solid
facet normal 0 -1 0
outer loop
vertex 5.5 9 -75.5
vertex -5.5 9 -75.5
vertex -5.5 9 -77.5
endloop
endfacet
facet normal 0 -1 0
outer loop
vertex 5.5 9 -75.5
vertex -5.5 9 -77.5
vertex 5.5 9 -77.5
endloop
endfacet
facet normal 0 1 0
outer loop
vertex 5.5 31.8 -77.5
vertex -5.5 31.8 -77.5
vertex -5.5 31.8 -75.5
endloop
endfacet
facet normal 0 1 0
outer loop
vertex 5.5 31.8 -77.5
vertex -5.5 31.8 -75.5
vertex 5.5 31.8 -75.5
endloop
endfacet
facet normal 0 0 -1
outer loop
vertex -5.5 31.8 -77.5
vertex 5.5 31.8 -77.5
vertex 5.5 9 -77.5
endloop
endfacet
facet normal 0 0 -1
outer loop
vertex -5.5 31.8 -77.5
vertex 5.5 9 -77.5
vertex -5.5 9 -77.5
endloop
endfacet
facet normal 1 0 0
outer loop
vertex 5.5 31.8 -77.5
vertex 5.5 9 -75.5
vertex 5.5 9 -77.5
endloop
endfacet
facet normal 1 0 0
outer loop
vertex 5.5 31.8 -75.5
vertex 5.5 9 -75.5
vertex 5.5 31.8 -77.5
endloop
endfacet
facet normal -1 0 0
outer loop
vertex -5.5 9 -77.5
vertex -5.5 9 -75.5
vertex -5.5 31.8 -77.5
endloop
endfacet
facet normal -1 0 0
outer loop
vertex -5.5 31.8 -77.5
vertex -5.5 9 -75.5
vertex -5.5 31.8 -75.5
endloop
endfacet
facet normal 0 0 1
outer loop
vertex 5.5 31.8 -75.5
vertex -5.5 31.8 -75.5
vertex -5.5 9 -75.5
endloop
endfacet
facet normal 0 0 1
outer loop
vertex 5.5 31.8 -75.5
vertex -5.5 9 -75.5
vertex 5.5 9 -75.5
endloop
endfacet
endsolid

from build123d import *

# Parameters (mm, degrees)
SKETCH1_W                       = 39
SKETCH1_H                       = 155
BOSS_EXTRUDE1_DEPTH             = 2
BOSS_EXTRUDE2_DEPTH             = 38
SKETCH3_W                       = 2
SKETCH3_H                       = 2
BOSS_EXTRUDE3_DEPTH             = 38
SKETCH4_W                       = 2
SKETCH4_H                       = 2
BOSS_EXTRUDE4_DEPTH             = 151
SKETCH6_W                       = 35
SKETCH6_H                       = 2.2
CUT_EXTRUDE1_DEPTH              = 160.340045186
SKETCH7_W                       = 35
SKETCH7_H                       = 2.2
CUT_EXTRUDE2_DEPTH              = 89.490112442
SKETCH5_W                       = 31
SKETCH5_H                       = 2
BOSS_EXTRUDE5_DEPTH             = 2
BOSS_EXTRUDE6_REACH             = 91.367
SKETCH8_W                       = 2
SKETCH8_H                       = 2
BOSS_EXTRUDE6_DIRECTION_2_REACH = 91.367
SKETCH10_W                      = 2
SKETCH10_H                      = 2.2
SKETCH10_W_2                    = 2.2
SKETCH10_H_2                    = 2
BOSS_EXTRUDE8_DEPTH             = 2
SKETCH11_W                      = 2
SKETCH11_H                      = 2.2
SKETCH11_W_2                    = 2.2
SKETCH11_H_2                    = 2
BOSS_EXTRUDE9_DEPTH             = 2
FILLET2_R                       = 2.5
SKETCH14_W                      = 36.5
SKETCH14_H                      = 7.75
BOSS_EXTRUDE10_DEPTH            = 2
SKETCH13_W                      = 31
SKETCH13_H                      = 3
CUT_EXTRUDE4_DEPTH              = 2
FILLET3_R                       = 2
FILLET4_R                       = 0.5
SKETCH15_R                      = 5.1
CUT_EXTRUDE5_DEPTH              = 90.367219941
SKETCH16_R                      = 7.1
BOSS_EXTRUDE11_DEPTH            = 1
FILLET5_R                       = 0.5
FILLET7_R                       = 0.5
CUT_EXTRUDE6_DEPTH              = 6
SKETCH18_W                      = 29
SKETCH18_H                      = 3
CUT_EXTRUDE8_DEPTH              = 90.367219986
CUT_EXTRUDE11_DEPTH             = 90.367219986
CUT_EXTRUDE11_DEPTH_BACK        = 90.367219986
SKETCH20_W                      = 5
SKETCH20_H                      = 40
SKETCH21_W                      = 9
SKETCH21_H                      = 31
CUT_EXTRUDE12_DEPTH             = 89.41097217
CUT_EXTRUDE13_DEPTH             = 41.425858061
CUT_EXTRUDE13_DEPTH_BACK        = 41.425858061
SKETCH22_W                      = 11
SKETCH22_H                      = 8.2


with BuildPart() as part:
    # Sketch1 → Boss-Extrude1 (new body)
    with BuildSketch(Plane(origin=(0, 0, 0), x_dir=(1, 0, 0), z_dir=(0, 1, 0))):
        Rectangle(SKETCH1_W, SKETCH1_H)
    extrude(amount=BOSS_EXTRUDE1_DEPTH)

    # Sketch2 → Boss-Extrude2 (add)
    with BuildSketch(Plane(origin=(0, 2, 0), x_dir=(1, 0, 0), z_dir=(0, 1, 0))):
        Polygon((-17.5, -77.5), (-17.5, -75.5), (-17.5, 75.5), (17.5, 75.5), (17.5, -75.5), (17.5, -77.5), (19.5, -77.5), (19.5, 77.5), (-19.5, 77.5), (-19.5, -77.5), align=None)
    extrude(amount=BOSS_EXTRUDE2_DEPTH)

    # Sketch3 → Boss-Extrude3 (add)
    with BuildSketch(Plane(origin=(0, 2, 0), x_dir=(1, 0, 0), z_dir=(0, 1, 0))):
        with Locations((-16.5, -76.5)):
            Rectangle(SKETCH3_W, SKETCH3_H)
        with Locations((-16.5, -72.3)):
            Rectangle(SKETCH3_W, SKETCH3_H)
        with Locations((16.5, -76.5)):
            Rectangle(SKETCH3_W, SKETCH3_H)
        with Locations((16.5, -72.3)):
            Rectangle(SKETCH3_W, SKETCH3_H)
    extrude(amount=BOSS_EXTRUDE3_DEPTH)

    # Sketch4 → Boss-Extrude4 (add)
    with BuildSketch(Plane.XY.offset(-75.5)):
        with Locations((-16.5, 39)):
            Rectangle(SKETCH4_W, SKETCH4_H)
        Polygon((-15.5, 33.8), (-17.5, 31.8), (-17.5, 35.8), (-15.5, 35.8), align=None)
        Polygon((15.5, 35.8), (17.5, 35.8), (17.5, 31.8), (15.5, 33.8), align=None)
        with Locations((16.5, 39)):
            Rectangle(SKETCH4_W, SKETCH4_H)
    extrude(amount=BOSS_EXTRUDE4_DEPTH)

    # Sketch6 → Cut-Extrude1 (cut, through all)
    with BuildSketch(Plane.XY.offset(-75.5)):
        with Locations((0, 36.9)):
            Rectangle(SKETCH6_W, SKETCH6_H)
    extrude(amount=CUT_EXTRUDE1_DEPTH, mode=Mode.SUBTRACT)

    # Sketch7 → Cut-Extrude2 (cut, through all)
    with BuildSketch(Plane(origin=(0, 2, 0), x_dir=(1, 0, 0), z_dir=(0, 1, 0))):
        with Locations((0, -74.4)):
            Rectangle(SKETCH7_W, SKETCH7_H)
    extrude(amount=CUT_EXTRUDE2_DEPTH, mode=Mode.SUBTRACT)

    # Sketch5 → Boss-Extrude5 (add)
    with BuildSketch(Plane(origin=(0, 2, 0), x_dir=(1, 0, 0), z_dir=(0, 1, 0))):
        with Locations((0, -76.5)):
            Rectangle(SKETCH5_W, SKETCH5_H)
        with Locations((0, -72.3)):
            Rectangle(SKETCH5_W, SKETCH5_H)
    extrude(amount=BOSS_EXTRUDE5_DEPTH)

    # Boss-Extrude6: up to this face of the body (flat: up to its plane)
    boss_extrude6_end = Plane(part.part.faces().sort_by_distance((17.5, 16.9, -2.1))[0])
    # Sketch8 → Boss-Extrude6 (add, up to the picked face)
    with BuildSketch(Plane(origin=(0, 0, 0), x_dir=(0, 0, -1), z_dir=(1, 0, 0)), mode=Mode.PRIVATE) as boss_extrude6_sk1:
        with Locations((74.5, 39)):
            Rectangle(SKETCH8_W, SKETCH8_H)
    boss_extrude6_tool1 = split(extrude(boss_extrude6_sk1.sketch, amount=BOSS_EXTRUDE6_REACH, mode=Mode.PRIVATE), bisect_by=boss_extrude6_end, keep=Keep.BOTH, mode=Mode.PRIVATE)
    # Sketch8 → Boss-Extrude6 (add, up to the picked face)
    with BuildSketch(Plane(origin=(0, 0, 0), x_dir=(0, 0, -1), z_dir=(1, 0, 0)), mode=Mode.PRIVATE) as boss_extrude6_sk2:
        Polygon((75.5, 35.8), (73.5, 35.8), (73.5, 33.8), (75.5, 31.8), align=None)
    boss_extrude6_tool2 = split(extrude(boss_extrude6_sk2.sketch, amount=BOSS_EXTRUDE6_REACH, mode=Mode.PRIVATE), bisect_by=boss_extrude6_end, keep=Keep.BOTH, mode=Mode.PRIVATE)
    add(boss_extrude6_tool1.solids().sort_by(Axis((0, 39, -74.5), (1, 0, 0)))[0])
    add(boss_extrude6_tool2.solids().sort_by(Axis((0, 34.244444, -74.611111), (1, 0, 0)))[0])

    # Boss-Extrude6 direction 2: up to this face of the body (flat: up to its plane)
    boss_extrude6_direction_2_end = Plane(part.part.faces().sort_by_distance((-17.5, 16.9, -2.1))[0])
    # Sketch8 → Boss-Extrude6 direction 2 (add, up to the picked face)
    with BuildSketch(Plane(origin=(0, 0, 0), x_dir=(0, 0, -1), z_dir=(1, 0, 0)), mode=Mode.PRIVATE) as boss_extrude6_direction_2_sk1:
        with Locations((74.5, 39)):
            Rectangle(SKETCH8_W, SKETCH8_H)
    boss_extrude6_direction_2_tool1 = split(extrude(boss_extrude6_direction_2_sk1.sketch, amount=-BOSS_EXTRUDE6_DIRECTION_2_REACH, mode=Mode.PRIVATE), bisect_by=boss_extrude6_direction_2_end, keep=Keep.BOTH, mode=Mode.PRIVATE)
    # Sketch8 → Boss-Extrude6 direction 2 (add, up to the picked face)
    with BuildSketch(Plane(origin=(0, 0, 0), x_dir=(0, 0, -1), z_dir=(1, 0, 0)), mode=Mode.PRIVATE) as boss_extrude6_direction_2_sk2:
        Polygon((75.5, 35.8), (73.5, 35.8), (73.5, 33.8), (75.5, 31.8), align=None)
    boss_extrude6_direction_2_tool2 = split(extrude(boss_extrude6_direction_2_sk2.sketch, amount=-BOSS_EXTRUDE6_DIRECTION_2_REACH, mode=Mode.PRIVATE), bisect_by=boss_extrude6_direction_2_end, keep=Keep.BOTH, mode=Mode.PRIVATE)
    add(boss_extrude6_direction_2_tool1.solids().sort_by(Axis((0, 39, -74.5), (-1, 0, 0)))[0])
    add(boss_extrude6_direction_2_tool2.solids().sort_by(Axis((0, 34.244444, -74.611111), (-1, 0, 0)))[0])

    # Sketch10 → Boss-Extrude8 (add)
    with BuildSketch(Plane(origin=(-17.5, 0, 0), x_dir=(0, 0, -1), z_dir=(1, 0, 0))):
        with Locations((-76.5, 36.9)):
            Rectangle(SKETCH10_W, SKETCH10_H)
        with Locations((-74.4, 39)):
            Rectangle(SKETCH10_W_2, SKETCH10_H_2)
    extrude(amount=BOSS_EXTRUDE8_DEPTH)

    # Sketch11 → Boss-Extrude9 (add)
    with BuildSketch(Plane.ZY.offset(-17.5)):
        with Locations((76.5, 36.9)):
            Rectangle(SKETCH11_W, SKETCH11_H)
        with Locations((74.4, 39)):
            Rectangle(SKETCH11_W_2, SKETCH11_H_2)
    extrude(amount=BOSS_EXTRUDE9_DEPTH)

    # Fillet2
    fillet2_edges = [part.edges().sort_by_distance(p)[0] for p in [
        (-17.5, 16.9, 71.3),
        (17.5, 16.9, 71.3),
        (19.5, 20, 77.5),
        (-19.5, 20, 77.5),
        (-19.5, 20, -77.5),
        (-17.5, 16.9, -75.5),
        (17.5, 16.9, -75.5),
        (19.5, 20, -77.5),
        (19.5, 40, 0),
        (-19.5, 40, 0),
        (19.5, 0, 0),
        (-19.5, 0, 0),
        (0, 40, -77.5),
        (0, 0, 77.5),
        (0, 0, -77.5),
        (-17.5, 40, 77.5),
        (17.5, 40, 77.5),
    ]]
    fillet(fillet2_edges, radius=FILLET2_R)

    # Sketch14 → Boss-Extrude10 (add)
    with BuildSketch(Plane.XY.offset(-75.5)):
        with Locations((0, 5.125)):
            Rectangle(SKETCH14_W, SKETCH14_H)
    extrude(amount=BOSS_EXTRUDE10_DEPTH)

    # Sketch13 → Cut-Extrude4 (cut)
    with BuildSketch(Plane(origin=(0, 0, -77.5), x_dir=(-1, 0, 0), z_dir=(0, 0, -1))):
        with Locations((0, 5.5)):
            Rectangle(SKETCH13_W, SKETCH13_H)
    extrude(amount=-CUT_EXTRUDE4_DEPTH, mode=Mode.SUBTRACT)

    # Fillet3
    fillet3_edges = [part.edges().sort_by_distance(p)[0] for p in [
        (0, 9, -73.5),
    ]]
    fillet(fillet3_edges, radius=FILLET3_R - 0.0001)  # a hair under: the kernel refuses the full size

    # Fillet4
    fillet4_edges = [part.edges().sort_by_distance(p)[0] for p in [
        (15.5, 5.5, -75.5),
        (15.5, 4, -76.5),
        (0, 7, -75.5),
        (15.5, 7, -76.5),
        (-15.5, 5.5, -75.5),
        (-15.5, 7, -76.5),
        (0, 4, -75.5),
        (-15.5, 4, -76.5),
        (15.5, 5.5, -77.5),
        (0, 4, -77.5),
        (-15.5, 5.5, -77.5),
        (0, 7, -77.5),
    ]]
    fillet(fillet4_edges, radius=FILLET4_R)

    # Sketch15 → Cut-Extrude5 (cut, through all)
    with BuildSketch(Plane.XZ):
        with Locations(Location((0, 38.75, 0), (0, 0, 270))):
            Circle(SKETCH15_R)
        with Locations(Location((0, -38.75, 0), (0, 0, 270))):
            Circle(SKETCH15_R)
    extrude(amount=-CUT_EXTRUDE5_DEPTH, mode=Mode.SUBTRACT)

    # Sketch16 → Boss-Extrude11 (add)
    with BuildSketch(Plane(origin=(0, 2, 0), x_dir=(1, 0, 0), z_dir=(0, 1, 0))):
        with Locations(Location((0, 38.75, 0), (0, 0, 270))):
            Circle(SKETCH16_R)
        with Locations(Location((0, -38.75, 0), (0, 0, 270))):
            Circle(SKETCH16_R)
    extrude(amount=BOSS_EXTRUDE11_DEPTH)

    # Fillet5
    fillet5_edges = [part.edges().sort_by_distance(p)[0] for p in [
        (0, 2, -45.85),
        (0, 3, -45.85),
        (0, 2, 31.65),
        (0, 3, 31.65),
    ]]
    fillet(fillet5_edges, radius=FILLET5_R - 0.0001)  # a hair under: the kernel refuses the full size

    # Fillet7
    fillet7_edges = [part.edges().sort_by_distance(p)[0] for p in [
        (15.5, 40, 0.75),
        (0, 4, 77.5),
        (0, 40, -73.5),
        (-15.5, 40, 0.75),
        (-15.5, 20.75, 77.5),
        (-15.5, 39.267766953, 76.767766953),
        (15.5, 20.75, 77.5),
        (15.5, 39.267766953, 76.767766953),
    ]]
    fillet(fillet7_edges, radius=FILLET7_R)

    # Sketch17 → Cut-Extrude6 (cut)
    with BuildSketch(Plane.XZ):
        Polygon((-17, -77.5), (-17, 70.299999999), (-14.999999999, 71.3), (-14.999999999, 77.5), (14.999999999, 77.5), (14.999999999, 71.3), (17, 70.299999999), (17, -77.5), align=None)
    extrude(amount=-CUT_EXTRUDE6_DEPTH, mode=Mode.SUBTRACT)

    # Sketch18 → Cut-Extrude8 (cut, through all)
    with BuildSketch(Plane.XY):
        with Locations((0, 7.5)):
            Rectangle(SKETCH18_W, SKETCH18_H)
    extrude(amount=-CUT_EXTRUDE8_DEPTH, mode=Mode.SUBTRACT)

    # Sketch20 → Cut-Extrude11 (cut, two sides: drawn at the far end of the back side and taken through both)
    with BuildSketch(Plane.XY.offset(-CUT_EXTRUDE11_DEPTH_BACK)):
        Polygon((19.5, 40), (14.5, 40), (14.5, 6), (14.5, 0), (19.5, 0), align=None)
        with Locations((-17, 20)):
            Rectangle(SKETCH20_W, SKETCH20_H)
    extrude(amount=CUT_EXTRUDE11_DEPTH + CUT_EXTRUDE11_DEPTH_BACK, mode=Mode.SUBTRACT)

    # Sketch21 → Cut-Extrude12 (cut, through all)
    with BuildSketch(Plane.XY):
        with Locations((-10, 24.5)):
            Rectangle(SKETCH21_W, SKETCH21_H)
        with Locations((10, 24.5)):
            Rectangle(SKETCH21_W, SKETCH21_H)
    extrude(amount=-CUT_EXTRUDE12_DEPTH, mode=Mode.SUBTRACT)

    # Sketch22 → Cut-Extrude13 (cut, two sides: drawn at the far end of the back side and taken through both)
    with BuildSketch(Plane.XY.offset(-75.5).offset(-CUT_EXTRUDE13_DEPTH_BACK)):
        with Locations((0, 35.9)):
            Rectangle(SKETCH22_W, SKETCH22_H)
    extrude(amount=CUT_EXTRUDE13_DEPTH + CUT_EXTRUDE13_DEPTH_BACK, mode=Mode.SUBTRACT)


solid = part.part
